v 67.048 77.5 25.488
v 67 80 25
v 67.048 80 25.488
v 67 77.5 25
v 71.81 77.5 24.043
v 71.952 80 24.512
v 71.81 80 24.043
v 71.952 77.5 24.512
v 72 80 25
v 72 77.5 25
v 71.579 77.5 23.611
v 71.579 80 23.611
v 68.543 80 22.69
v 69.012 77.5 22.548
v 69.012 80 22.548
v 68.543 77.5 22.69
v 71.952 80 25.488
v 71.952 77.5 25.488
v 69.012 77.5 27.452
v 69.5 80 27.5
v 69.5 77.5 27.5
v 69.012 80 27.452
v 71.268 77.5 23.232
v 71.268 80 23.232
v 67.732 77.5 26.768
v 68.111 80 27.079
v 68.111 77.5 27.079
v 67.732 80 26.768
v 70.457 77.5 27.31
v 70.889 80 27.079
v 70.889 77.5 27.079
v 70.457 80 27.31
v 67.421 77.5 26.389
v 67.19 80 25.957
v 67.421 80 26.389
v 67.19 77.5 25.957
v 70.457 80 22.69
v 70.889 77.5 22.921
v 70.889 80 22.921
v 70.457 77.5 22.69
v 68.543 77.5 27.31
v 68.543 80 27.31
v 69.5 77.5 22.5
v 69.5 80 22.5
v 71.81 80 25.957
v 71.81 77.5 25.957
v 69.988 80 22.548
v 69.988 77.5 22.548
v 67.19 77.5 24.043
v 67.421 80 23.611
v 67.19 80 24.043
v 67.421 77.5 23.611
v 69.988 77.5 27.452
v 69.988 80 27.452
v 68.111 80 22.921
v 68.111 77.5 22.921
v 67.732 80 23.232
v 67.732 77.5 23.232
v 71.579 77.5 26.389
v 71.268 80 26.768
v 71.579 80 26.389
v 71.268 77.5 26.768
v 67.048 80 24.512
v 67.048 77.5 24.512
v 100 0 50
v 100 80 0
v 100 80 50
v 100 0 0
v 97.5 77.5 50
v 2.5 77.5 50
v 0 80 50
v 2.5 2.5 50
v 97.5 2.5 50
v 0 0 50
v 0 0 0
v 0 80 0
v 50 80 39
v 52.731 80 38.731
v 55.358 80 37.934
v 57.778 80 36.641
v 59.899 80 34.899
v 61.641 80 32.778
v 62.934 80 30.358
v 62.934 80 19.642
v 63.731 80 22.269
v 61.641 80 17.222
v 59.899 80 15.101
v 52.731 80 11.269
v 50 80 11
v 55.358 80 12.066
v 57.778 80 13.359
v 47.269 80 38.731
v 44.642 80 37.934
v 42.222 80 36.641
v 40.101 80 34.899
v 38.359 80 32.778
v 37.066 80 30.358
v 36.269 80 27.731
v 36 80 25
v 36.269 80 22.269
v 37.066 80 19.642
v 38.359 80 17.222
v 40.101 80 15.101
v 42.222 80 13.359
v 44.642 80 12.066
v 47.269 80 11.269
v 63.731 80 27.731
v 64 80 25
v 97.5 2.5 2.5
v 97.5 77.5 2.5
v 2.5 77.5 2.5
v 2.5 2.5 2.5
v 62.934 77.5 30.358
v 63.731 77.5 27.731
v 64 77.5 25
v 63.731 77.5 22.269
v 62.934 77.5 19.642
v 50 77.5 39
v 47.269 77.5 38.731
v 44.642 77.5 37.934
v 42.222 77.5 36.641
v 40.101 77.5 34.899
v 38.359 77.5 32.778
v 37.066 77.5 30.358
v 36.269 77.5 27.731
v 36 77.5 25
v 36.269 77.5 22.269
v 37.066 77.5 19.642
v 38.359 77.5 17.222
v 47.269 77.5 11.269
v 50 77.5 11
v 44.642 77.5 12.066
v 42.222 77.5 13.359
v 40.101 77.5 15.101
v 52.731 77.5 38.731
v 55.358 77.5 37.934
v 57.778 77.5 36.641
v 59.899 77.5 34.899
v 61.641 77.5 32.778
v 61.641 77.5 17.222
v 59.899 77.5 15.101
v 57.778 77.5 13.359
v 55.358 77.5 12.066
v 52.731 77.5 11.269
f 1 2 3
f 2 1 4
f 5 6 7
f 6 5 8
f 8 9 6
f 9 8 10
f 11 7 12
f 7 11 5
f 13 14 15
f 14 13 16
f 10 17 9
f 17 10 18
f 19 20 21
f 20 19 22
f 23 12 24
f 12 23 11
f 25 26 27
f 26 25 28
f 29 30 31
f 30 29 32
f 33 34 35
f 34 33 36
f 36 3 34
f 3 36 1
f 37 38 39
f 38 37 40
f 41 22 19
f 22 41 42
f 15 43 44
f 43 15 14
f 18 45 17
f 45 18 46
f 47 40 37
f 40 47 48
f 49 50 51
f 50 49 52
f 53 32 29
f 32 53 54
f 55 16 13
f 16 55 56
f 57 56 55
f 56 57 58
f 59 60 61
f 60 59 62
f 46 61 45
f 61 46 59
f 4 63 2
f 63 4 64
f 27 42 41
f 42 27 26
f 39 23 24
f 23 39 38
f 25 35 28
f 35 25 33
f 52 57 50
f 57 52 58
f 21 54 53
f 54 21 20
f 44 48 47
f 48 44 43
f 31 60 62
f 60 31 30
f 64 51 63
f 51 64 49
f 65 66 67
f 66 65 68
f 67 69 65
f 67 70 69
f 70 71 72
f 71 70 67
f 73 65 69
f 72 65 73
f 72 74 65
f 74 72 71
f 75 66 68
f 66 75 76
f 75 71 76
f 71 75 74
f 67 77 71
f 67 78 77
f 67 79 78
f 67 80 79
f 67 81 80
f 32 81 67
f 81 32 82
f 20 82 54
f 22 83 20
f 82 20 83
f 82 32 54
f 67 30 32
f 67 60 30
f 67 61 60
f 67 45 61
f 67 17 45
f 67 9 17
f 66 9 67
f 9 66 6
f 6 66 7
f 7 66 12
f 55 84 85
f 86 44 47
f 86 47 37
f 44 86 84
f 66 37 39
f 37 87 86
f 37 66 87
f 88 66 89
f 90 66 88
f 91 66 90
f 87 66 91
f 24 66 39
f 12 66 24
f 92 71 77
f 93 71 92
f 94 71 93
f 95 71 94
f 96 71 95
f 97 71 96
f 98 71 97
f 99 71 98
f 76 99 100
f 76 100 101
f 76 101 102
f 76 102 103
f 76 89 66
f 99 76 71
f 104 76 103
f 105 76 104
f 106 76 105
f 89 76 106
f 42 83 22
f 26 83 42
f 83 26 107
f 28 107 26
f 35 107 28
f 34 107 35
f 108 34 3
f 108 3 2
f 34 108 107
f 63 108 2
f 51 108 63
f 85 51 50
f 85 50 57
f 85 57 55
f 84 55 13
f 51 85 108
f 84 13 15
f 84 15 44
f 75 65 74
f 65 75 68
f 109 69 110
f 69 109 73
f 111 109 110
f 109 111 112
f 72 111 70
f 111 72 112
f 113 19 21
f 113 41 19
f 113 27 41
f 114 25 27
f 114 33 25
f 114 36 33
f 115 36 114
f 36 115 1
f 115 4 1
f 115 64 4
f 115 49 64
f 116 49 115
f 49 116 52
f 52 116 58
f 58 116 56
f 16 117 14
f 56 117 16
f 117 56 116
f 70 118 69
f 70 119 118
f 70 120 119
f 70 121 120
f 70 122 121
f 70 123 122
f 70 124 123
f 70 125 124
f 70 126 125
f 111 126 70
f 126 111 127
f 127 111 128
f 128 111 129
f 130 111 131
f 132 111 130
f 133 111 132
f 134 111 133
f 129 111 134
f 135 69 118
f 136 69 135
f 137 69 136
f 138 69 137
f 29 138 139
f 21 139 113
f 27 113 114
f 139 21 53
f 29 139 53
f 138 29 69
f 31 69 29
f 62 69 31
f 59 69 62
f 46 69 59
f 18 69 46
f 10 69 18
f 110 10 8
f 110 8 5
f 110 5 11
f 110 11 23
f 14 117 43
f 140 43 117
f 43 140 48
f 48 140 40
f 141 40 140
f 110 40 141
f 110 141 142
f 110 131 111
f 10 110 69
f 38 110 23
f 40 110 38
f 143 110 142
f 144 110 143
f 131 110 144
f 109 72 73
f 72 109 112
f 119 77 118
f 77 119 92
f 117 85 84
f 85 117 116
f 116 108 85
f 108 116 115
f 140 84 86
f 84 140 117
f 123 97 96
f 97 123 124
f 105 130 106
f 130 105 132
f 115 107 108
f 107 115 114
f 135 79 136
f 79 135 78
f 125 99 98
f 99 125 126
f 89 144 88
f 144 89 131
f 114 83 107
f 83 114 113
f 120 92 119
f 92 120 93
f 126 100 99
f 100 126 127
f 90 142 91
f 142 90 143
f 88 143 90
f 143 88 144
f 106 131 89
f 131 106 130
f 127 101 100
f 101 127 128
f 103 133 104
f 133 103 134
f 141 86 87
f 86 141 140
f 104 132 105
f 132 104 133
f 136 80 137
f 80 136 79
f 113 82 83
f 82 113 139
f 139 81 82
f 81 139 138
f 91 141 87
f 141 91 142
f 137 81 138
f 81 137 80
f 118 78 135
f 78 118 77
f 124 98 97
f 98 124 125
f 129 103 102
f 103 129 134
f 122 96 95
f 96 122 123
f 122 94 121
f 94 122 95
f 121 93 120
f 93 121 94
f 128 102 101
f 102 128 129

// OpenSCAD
$fn = 32;

// ----------------------------------------------------------------------
// Vent box: roundvent enclosure
// ----------------------------------------------------------------------

// --- parameters (mm) ---
box_l = 100;              // box length, X
box_w = 80;               // box width, Y
box_h = 50;               // box height, Z
wall_t = 2.5;             // shell wall thickness
vent_d = 28;              // central vent diameter
ring_d = 5;               // ring hole diameter
n_ring = 8;               // holes in the ring
ring_r = 19.5;            // ring radius

ring_step = 360 / n_ring;  // ring hole angular step

difference() {
  cube([box_l, box_w, box_h]);
  translate([wall_t, wall_t, wall_t])
    cube([box_l - 2 * wall_t, box_w - 2 * wall_t, box_h]);
  translate([box_l / 2, box_w - wall_t - 1, box_h / 2])
    rotate([-90, 0, 0]) cylinder(h = wall_t + 2, d = vent_d);
  for (i = [0 : n_ring - 1])
    translate([box_l / 2, box_w - wall_t - 1, box_h / 2])
      rotate([0, 0, i * ring_step])
        translate([ring_r, 0, 0]) rotate([-90, 0, 0])
          cylinder(h = wall_t + 2, d = ring_d);
}
